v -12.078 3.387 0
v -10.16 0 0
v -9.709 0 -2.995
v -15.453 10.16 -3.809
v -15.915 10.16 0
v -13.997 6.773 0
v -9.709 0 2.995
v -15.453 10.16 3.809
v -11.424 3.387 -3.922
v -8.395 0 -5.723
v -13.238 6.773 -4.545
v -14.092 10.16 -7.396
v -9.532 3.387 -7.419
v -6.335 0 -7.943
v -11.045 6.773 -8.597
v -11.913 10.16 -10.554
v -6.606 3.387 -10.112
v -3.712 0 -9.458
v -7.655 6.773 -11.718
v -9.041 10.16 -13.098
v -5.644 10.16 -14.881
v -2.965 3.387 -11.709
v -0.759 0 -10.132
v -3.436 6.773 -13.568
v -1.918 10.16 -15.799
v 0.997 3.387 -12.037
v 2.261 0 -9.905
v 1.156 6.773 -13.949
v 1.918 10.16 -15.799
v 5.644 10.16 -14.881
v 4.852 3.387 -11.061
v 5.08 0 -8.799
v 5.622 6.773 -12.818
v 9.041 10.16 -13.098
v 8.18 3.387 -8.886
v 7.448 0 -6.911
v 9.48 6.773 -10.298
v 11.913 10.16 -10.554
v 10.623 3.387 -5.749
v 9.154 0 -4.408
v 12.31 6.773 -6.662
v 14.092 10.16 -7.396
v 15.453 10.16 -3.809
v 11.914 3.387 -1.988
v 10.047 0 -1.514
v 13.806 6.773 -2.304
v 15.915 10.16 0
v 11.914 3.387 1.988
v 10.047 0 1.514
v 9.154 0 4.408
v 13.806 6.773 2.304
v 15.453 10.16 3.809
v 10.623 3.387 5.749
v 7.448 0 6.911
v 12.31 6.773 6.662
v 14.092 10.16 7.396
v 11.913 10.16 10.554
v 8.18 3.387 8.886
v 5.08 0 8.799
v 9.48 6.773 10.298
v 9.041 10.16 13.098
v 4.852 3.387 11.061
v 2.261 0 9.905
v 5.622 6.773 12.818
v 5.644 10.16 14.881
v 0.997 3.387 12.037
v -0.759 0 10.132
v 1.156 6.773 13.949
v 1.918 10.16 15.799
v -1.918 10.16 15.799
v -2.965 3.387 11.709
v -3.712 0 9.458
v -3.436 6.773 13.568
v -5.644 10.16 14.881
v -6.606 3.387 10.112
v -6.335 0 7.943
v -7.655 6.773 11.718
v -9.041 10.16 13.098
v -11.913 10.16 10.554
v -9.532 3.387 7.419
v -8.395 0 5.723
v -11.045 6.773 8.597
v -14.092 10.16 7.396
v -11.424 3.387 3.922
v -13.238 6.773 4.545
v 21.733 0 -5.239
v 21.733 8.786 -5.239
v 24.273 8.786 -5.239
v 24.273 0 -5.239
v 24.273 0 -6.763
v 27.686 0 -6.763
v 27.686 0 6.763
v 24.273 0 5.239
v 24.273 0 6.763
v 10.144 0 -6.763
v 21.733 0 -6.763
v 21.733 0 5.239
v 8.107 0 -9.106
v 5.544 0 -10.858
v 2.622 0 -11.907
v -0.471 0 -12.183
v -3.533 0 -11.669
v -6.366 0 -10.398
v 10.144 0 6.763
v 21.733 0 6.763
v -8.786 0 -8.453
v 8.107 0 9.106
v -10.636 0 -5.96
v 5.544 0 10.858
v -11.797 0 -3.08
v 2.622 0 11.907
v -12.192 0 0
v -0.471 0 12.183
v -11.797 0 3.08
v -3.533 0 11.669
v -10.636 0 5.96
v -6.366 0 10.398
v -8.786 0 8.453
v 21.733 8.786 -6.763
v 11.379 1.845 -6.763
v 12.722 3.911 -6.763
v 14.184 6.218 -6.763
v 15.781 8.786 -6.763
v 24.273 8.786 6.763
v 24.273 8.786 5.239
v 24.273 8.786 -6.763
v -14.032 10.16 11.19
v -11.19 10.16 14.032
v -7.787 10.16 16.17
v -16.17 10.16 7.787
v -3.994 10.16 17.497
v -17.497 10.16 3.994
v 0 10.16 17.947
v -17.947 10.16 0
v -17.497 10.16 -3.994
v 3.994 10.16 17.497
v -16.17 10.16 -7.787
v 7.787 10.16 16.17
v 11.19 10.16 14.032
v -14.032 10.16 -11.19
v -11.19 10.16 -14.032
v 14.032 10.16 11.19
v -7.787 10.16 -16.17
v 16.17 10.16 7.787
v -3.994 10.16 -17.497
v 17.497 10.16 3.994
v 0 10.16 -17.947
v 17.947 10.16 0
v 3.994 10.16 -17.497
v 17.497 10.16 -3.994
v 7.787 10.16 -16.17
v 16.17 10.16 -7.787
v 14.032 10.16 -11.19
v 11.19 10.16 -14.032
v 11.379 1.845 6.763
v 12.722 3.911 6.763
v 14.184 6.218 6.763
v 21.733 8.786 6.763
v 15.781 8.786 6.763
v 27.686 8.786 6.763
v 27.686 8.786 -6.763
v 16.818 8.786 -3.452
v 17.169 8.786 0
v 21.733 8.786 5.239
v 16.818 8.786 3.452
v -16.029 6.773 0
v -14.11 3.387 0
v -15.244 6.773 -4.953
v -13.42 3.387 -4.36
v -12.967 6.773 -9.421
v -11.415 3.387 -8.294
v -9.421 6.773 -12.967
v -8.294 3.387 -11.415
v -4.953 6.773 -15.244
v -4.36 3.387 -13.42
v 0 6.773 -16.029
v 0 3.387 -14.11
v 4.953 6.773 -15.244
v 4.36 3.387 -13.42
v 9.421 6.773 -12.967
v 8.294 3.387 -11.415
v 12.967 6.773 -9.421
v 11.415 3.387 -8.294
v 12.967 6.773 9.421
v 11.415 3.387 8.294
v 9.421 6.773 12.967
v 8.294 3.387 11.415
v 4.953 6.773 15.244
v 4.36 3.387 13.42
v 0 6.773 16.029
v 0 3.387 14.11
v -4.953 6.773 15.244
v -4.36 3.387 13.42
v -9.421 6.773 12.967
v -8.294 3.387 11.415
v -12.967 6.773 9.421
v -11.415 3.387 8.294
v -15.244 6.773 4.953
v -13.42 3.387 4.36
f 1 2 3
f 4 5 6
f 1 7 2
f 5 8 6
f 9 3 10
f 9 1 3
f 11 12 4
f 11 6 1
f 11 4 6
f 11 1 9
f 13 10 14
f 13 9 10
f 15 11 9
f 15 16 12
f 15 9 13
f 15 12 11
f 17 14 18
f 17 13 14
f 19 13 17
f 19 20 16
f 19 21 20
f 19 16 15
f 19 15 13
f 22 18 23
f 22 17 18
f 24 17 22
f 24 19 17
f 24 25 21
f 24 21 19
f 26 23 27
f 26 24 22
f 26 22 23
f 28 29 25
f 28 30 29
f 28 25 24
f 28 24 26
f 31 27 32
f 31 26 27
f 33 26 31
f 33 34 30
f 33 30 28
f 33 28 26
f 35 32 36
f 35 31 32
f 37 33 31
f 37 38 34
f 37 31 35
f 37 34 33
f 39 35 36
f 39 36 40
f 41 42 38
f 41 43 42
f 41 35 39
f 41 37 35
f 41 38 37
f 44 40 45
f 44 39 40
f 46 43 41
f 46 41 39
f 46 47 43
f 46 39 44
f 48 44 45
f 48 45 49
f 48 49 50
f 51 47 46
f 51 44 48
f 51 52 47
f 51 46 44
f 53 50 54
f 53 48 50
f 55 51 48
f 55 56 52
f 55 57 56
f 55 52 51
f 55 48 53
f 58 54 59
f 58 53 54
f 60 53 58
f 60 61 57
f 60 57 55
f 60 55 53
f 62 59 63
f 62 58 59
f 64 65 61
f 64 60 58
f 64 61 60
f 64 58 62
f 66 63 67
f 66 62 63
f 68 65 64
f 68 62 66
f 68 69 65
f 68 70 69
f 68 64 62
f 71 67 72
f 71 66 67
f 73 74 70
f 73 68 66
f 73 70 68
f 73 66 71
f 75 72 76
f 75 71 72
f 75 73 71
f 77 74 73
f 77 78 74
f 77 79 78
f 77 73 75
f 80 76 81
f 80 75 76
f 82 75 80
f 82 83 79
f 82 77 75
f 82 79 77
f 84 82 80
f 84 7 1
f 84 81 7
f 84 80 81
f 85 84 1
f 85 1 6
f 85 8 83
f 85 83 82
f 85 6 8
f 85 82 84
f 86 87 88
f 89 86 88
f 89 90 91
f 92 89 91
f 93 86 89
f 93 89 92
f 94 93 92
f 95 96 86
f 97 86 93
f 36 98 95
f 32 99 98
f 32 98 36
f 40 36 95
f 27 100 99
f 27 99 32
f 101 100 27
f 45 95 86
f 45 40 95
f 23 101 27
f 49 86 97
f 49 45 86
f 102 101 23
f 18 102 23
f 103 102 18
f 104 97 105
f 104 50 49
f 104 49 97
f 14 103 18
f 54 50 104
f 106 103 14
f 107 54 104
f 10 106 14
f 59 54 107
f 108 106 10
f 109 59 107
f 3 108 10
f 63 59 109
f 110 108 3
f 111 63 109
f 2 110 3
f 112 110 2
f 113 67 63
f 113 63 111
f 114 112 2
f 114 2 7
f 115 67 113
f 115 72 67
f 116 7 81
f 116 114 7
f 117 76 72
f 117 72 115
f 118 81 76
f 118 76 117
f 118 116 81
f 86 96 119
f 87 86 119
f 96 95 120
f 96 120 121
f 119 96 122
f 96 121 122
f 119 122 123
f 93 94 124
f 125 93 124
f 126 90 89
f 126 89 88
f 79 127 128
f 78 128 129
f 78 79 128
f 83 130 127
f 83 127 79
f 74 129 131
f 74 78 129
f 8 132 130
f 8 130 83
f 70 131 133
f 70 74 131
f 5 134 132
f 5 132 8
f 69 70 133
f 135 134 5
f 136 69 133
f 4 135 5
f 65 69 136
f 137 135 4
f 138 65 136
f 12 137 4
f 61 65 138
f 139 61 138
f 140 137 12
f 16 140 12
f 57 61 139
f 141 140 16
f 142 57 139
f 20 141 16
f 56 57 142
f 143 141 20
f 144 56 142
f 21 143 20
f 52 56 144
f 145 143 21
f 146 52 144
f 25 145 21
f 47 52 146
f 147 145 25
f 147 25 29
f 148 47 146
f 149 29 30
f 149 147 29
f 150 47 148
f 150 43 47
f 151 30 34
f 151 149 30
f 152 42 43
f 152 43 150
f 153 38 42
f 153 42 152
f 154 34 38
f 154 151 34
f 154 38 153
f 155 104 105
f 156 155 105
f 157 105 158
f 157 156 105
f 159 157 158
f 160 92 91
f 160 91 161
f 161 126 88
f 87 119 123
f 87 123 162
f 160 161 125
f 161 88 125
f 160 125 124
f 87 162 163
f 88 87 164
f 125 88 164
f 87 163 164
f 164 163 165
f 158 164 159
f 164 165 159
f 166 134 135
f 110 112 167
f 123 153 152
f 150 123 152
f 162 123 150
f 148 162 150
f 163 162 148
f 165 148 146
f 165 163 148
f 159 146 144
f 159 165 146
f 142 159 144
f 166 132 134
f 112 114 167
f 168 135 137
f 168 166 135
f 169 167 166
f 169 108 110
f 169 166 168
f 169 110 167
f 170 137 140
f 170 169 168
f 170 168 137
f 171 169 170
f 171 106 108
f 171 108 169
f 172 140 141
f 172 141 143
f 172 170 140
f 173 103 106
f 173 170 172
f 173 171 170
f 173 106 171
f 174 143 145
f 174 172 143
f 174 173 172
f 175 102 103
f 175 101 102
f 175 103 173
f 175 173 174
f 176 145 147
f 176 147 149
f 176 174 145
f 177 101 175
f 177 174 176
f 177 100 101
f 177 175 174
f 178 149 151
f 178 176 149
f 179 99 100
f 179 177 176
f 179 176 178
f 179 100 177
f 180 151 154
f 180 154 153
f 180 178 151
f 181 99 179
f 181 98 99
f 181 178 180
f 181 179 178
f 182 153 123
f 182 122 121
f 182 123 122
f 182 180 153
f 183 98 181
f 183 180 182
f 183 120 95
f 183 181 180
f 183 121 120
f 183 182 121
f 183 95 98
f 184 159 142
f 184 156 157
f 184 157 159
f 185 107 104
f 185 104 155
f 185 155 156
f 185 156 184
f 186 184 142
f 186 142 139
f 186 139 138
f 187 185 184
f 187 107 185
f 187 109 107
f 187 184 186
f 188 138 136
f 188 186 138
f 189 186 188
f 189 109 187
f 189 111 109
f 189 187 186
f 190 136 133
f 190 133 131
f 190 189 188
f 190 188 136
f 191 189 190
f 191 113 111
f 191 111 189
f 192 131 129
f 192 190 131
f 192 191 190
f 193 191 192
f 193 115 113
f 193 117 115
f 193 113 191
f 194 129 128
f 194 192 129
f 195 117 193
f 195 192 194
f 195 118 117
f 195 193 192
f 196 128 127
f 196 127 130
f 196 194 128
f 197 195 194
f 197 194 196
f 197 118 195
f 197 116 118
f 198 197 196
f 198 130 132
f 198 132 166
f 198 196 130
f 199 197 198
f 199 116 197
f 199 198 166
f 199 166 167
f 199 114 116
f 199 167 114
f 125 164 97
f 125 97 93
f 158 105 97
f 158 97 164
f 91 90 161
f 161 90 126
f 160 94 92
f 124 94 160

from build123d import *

# Parameters (mm, degrees)
F3_W     = 8.786383085
F3_H     = 13.5255949572
F5_DEPTH = 10.16
F6_W     = 2.54
F6_H     = 8.786383085
F7_DEPTH = 1.524


# Not quite as in the source:
# - a pattern or mirror of a feature is missing from the dataset's text; its kind, count and spacing are read off the source's solid


with BuildPart() as f1:
    # F0 (on Top) → F1 (revolve)
    with BuildSketch(Plane.XY):
        Polygon((-12.192, 0), (-10.16, 0), (-15.9150013827, 10.16), (-17.9470013827, 10.16), align=None)
    revolve(axis=Axis((0, 4.3423168827, 0), (0, -1, 0)))

    # F3 (on offset) → F4 (join, up to the next surface of F1)
    with BuildSketch(Plane.YZ.offset(17.526)):
        with Locations((4.3931915425, 0)):
            Rectangle(F3_W, F3_H)
    extrude(until=Until.NEXT, dir=(-1, 0, 0))

    # F5 (add): a face of the model
    f5_faces = [f1.faces().sort_by_distance(p)[0] for p in [
        (17.526, 4.3931915425, 0),
    ]]
    extrude(f5_faces, amount=F5_DEPTH)

    # F6 (on face) → F7 (cut)
    with BuildSketch(Plane.XY.offset(6.7627974786)):
        with Locations((23.0034508117, 4.3931915425)):
            Rectangle(F6_W, F6_H)
    f7 = extrude(amount=-F7_DEPTH, mode=Mode.SUBTRACT)

    # F7_copies: F7 across plane
    add(f7.mirror(Plane(origin=(0, 0, 0), x_dir=(-1, 0, 0), z_dir=(0, 0, -1))), mode=Mode.SUBTRACT)


solid = f1.part
